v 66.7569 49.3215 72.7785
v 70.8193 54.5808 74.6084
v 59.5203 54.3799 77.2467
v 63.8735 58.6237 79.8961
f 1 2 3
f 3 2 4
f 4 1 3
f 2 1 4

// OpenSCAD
// Auto-generated auxetic polyhedron
points = [
    [59.520340, 54.379946, 77.246716],
    [70.819306, 54.580792, 74.608366],
    [66.756905, 49.321526, 72.778494],
    [63.873512, 58.623732, 79.896061],
];

faces = [
    [0, 1, 2],
    [3, 1, 0],
    [0, 2, 3],
    [3, 2, 1],
];

polyhedron(points = points, faces = faces);
